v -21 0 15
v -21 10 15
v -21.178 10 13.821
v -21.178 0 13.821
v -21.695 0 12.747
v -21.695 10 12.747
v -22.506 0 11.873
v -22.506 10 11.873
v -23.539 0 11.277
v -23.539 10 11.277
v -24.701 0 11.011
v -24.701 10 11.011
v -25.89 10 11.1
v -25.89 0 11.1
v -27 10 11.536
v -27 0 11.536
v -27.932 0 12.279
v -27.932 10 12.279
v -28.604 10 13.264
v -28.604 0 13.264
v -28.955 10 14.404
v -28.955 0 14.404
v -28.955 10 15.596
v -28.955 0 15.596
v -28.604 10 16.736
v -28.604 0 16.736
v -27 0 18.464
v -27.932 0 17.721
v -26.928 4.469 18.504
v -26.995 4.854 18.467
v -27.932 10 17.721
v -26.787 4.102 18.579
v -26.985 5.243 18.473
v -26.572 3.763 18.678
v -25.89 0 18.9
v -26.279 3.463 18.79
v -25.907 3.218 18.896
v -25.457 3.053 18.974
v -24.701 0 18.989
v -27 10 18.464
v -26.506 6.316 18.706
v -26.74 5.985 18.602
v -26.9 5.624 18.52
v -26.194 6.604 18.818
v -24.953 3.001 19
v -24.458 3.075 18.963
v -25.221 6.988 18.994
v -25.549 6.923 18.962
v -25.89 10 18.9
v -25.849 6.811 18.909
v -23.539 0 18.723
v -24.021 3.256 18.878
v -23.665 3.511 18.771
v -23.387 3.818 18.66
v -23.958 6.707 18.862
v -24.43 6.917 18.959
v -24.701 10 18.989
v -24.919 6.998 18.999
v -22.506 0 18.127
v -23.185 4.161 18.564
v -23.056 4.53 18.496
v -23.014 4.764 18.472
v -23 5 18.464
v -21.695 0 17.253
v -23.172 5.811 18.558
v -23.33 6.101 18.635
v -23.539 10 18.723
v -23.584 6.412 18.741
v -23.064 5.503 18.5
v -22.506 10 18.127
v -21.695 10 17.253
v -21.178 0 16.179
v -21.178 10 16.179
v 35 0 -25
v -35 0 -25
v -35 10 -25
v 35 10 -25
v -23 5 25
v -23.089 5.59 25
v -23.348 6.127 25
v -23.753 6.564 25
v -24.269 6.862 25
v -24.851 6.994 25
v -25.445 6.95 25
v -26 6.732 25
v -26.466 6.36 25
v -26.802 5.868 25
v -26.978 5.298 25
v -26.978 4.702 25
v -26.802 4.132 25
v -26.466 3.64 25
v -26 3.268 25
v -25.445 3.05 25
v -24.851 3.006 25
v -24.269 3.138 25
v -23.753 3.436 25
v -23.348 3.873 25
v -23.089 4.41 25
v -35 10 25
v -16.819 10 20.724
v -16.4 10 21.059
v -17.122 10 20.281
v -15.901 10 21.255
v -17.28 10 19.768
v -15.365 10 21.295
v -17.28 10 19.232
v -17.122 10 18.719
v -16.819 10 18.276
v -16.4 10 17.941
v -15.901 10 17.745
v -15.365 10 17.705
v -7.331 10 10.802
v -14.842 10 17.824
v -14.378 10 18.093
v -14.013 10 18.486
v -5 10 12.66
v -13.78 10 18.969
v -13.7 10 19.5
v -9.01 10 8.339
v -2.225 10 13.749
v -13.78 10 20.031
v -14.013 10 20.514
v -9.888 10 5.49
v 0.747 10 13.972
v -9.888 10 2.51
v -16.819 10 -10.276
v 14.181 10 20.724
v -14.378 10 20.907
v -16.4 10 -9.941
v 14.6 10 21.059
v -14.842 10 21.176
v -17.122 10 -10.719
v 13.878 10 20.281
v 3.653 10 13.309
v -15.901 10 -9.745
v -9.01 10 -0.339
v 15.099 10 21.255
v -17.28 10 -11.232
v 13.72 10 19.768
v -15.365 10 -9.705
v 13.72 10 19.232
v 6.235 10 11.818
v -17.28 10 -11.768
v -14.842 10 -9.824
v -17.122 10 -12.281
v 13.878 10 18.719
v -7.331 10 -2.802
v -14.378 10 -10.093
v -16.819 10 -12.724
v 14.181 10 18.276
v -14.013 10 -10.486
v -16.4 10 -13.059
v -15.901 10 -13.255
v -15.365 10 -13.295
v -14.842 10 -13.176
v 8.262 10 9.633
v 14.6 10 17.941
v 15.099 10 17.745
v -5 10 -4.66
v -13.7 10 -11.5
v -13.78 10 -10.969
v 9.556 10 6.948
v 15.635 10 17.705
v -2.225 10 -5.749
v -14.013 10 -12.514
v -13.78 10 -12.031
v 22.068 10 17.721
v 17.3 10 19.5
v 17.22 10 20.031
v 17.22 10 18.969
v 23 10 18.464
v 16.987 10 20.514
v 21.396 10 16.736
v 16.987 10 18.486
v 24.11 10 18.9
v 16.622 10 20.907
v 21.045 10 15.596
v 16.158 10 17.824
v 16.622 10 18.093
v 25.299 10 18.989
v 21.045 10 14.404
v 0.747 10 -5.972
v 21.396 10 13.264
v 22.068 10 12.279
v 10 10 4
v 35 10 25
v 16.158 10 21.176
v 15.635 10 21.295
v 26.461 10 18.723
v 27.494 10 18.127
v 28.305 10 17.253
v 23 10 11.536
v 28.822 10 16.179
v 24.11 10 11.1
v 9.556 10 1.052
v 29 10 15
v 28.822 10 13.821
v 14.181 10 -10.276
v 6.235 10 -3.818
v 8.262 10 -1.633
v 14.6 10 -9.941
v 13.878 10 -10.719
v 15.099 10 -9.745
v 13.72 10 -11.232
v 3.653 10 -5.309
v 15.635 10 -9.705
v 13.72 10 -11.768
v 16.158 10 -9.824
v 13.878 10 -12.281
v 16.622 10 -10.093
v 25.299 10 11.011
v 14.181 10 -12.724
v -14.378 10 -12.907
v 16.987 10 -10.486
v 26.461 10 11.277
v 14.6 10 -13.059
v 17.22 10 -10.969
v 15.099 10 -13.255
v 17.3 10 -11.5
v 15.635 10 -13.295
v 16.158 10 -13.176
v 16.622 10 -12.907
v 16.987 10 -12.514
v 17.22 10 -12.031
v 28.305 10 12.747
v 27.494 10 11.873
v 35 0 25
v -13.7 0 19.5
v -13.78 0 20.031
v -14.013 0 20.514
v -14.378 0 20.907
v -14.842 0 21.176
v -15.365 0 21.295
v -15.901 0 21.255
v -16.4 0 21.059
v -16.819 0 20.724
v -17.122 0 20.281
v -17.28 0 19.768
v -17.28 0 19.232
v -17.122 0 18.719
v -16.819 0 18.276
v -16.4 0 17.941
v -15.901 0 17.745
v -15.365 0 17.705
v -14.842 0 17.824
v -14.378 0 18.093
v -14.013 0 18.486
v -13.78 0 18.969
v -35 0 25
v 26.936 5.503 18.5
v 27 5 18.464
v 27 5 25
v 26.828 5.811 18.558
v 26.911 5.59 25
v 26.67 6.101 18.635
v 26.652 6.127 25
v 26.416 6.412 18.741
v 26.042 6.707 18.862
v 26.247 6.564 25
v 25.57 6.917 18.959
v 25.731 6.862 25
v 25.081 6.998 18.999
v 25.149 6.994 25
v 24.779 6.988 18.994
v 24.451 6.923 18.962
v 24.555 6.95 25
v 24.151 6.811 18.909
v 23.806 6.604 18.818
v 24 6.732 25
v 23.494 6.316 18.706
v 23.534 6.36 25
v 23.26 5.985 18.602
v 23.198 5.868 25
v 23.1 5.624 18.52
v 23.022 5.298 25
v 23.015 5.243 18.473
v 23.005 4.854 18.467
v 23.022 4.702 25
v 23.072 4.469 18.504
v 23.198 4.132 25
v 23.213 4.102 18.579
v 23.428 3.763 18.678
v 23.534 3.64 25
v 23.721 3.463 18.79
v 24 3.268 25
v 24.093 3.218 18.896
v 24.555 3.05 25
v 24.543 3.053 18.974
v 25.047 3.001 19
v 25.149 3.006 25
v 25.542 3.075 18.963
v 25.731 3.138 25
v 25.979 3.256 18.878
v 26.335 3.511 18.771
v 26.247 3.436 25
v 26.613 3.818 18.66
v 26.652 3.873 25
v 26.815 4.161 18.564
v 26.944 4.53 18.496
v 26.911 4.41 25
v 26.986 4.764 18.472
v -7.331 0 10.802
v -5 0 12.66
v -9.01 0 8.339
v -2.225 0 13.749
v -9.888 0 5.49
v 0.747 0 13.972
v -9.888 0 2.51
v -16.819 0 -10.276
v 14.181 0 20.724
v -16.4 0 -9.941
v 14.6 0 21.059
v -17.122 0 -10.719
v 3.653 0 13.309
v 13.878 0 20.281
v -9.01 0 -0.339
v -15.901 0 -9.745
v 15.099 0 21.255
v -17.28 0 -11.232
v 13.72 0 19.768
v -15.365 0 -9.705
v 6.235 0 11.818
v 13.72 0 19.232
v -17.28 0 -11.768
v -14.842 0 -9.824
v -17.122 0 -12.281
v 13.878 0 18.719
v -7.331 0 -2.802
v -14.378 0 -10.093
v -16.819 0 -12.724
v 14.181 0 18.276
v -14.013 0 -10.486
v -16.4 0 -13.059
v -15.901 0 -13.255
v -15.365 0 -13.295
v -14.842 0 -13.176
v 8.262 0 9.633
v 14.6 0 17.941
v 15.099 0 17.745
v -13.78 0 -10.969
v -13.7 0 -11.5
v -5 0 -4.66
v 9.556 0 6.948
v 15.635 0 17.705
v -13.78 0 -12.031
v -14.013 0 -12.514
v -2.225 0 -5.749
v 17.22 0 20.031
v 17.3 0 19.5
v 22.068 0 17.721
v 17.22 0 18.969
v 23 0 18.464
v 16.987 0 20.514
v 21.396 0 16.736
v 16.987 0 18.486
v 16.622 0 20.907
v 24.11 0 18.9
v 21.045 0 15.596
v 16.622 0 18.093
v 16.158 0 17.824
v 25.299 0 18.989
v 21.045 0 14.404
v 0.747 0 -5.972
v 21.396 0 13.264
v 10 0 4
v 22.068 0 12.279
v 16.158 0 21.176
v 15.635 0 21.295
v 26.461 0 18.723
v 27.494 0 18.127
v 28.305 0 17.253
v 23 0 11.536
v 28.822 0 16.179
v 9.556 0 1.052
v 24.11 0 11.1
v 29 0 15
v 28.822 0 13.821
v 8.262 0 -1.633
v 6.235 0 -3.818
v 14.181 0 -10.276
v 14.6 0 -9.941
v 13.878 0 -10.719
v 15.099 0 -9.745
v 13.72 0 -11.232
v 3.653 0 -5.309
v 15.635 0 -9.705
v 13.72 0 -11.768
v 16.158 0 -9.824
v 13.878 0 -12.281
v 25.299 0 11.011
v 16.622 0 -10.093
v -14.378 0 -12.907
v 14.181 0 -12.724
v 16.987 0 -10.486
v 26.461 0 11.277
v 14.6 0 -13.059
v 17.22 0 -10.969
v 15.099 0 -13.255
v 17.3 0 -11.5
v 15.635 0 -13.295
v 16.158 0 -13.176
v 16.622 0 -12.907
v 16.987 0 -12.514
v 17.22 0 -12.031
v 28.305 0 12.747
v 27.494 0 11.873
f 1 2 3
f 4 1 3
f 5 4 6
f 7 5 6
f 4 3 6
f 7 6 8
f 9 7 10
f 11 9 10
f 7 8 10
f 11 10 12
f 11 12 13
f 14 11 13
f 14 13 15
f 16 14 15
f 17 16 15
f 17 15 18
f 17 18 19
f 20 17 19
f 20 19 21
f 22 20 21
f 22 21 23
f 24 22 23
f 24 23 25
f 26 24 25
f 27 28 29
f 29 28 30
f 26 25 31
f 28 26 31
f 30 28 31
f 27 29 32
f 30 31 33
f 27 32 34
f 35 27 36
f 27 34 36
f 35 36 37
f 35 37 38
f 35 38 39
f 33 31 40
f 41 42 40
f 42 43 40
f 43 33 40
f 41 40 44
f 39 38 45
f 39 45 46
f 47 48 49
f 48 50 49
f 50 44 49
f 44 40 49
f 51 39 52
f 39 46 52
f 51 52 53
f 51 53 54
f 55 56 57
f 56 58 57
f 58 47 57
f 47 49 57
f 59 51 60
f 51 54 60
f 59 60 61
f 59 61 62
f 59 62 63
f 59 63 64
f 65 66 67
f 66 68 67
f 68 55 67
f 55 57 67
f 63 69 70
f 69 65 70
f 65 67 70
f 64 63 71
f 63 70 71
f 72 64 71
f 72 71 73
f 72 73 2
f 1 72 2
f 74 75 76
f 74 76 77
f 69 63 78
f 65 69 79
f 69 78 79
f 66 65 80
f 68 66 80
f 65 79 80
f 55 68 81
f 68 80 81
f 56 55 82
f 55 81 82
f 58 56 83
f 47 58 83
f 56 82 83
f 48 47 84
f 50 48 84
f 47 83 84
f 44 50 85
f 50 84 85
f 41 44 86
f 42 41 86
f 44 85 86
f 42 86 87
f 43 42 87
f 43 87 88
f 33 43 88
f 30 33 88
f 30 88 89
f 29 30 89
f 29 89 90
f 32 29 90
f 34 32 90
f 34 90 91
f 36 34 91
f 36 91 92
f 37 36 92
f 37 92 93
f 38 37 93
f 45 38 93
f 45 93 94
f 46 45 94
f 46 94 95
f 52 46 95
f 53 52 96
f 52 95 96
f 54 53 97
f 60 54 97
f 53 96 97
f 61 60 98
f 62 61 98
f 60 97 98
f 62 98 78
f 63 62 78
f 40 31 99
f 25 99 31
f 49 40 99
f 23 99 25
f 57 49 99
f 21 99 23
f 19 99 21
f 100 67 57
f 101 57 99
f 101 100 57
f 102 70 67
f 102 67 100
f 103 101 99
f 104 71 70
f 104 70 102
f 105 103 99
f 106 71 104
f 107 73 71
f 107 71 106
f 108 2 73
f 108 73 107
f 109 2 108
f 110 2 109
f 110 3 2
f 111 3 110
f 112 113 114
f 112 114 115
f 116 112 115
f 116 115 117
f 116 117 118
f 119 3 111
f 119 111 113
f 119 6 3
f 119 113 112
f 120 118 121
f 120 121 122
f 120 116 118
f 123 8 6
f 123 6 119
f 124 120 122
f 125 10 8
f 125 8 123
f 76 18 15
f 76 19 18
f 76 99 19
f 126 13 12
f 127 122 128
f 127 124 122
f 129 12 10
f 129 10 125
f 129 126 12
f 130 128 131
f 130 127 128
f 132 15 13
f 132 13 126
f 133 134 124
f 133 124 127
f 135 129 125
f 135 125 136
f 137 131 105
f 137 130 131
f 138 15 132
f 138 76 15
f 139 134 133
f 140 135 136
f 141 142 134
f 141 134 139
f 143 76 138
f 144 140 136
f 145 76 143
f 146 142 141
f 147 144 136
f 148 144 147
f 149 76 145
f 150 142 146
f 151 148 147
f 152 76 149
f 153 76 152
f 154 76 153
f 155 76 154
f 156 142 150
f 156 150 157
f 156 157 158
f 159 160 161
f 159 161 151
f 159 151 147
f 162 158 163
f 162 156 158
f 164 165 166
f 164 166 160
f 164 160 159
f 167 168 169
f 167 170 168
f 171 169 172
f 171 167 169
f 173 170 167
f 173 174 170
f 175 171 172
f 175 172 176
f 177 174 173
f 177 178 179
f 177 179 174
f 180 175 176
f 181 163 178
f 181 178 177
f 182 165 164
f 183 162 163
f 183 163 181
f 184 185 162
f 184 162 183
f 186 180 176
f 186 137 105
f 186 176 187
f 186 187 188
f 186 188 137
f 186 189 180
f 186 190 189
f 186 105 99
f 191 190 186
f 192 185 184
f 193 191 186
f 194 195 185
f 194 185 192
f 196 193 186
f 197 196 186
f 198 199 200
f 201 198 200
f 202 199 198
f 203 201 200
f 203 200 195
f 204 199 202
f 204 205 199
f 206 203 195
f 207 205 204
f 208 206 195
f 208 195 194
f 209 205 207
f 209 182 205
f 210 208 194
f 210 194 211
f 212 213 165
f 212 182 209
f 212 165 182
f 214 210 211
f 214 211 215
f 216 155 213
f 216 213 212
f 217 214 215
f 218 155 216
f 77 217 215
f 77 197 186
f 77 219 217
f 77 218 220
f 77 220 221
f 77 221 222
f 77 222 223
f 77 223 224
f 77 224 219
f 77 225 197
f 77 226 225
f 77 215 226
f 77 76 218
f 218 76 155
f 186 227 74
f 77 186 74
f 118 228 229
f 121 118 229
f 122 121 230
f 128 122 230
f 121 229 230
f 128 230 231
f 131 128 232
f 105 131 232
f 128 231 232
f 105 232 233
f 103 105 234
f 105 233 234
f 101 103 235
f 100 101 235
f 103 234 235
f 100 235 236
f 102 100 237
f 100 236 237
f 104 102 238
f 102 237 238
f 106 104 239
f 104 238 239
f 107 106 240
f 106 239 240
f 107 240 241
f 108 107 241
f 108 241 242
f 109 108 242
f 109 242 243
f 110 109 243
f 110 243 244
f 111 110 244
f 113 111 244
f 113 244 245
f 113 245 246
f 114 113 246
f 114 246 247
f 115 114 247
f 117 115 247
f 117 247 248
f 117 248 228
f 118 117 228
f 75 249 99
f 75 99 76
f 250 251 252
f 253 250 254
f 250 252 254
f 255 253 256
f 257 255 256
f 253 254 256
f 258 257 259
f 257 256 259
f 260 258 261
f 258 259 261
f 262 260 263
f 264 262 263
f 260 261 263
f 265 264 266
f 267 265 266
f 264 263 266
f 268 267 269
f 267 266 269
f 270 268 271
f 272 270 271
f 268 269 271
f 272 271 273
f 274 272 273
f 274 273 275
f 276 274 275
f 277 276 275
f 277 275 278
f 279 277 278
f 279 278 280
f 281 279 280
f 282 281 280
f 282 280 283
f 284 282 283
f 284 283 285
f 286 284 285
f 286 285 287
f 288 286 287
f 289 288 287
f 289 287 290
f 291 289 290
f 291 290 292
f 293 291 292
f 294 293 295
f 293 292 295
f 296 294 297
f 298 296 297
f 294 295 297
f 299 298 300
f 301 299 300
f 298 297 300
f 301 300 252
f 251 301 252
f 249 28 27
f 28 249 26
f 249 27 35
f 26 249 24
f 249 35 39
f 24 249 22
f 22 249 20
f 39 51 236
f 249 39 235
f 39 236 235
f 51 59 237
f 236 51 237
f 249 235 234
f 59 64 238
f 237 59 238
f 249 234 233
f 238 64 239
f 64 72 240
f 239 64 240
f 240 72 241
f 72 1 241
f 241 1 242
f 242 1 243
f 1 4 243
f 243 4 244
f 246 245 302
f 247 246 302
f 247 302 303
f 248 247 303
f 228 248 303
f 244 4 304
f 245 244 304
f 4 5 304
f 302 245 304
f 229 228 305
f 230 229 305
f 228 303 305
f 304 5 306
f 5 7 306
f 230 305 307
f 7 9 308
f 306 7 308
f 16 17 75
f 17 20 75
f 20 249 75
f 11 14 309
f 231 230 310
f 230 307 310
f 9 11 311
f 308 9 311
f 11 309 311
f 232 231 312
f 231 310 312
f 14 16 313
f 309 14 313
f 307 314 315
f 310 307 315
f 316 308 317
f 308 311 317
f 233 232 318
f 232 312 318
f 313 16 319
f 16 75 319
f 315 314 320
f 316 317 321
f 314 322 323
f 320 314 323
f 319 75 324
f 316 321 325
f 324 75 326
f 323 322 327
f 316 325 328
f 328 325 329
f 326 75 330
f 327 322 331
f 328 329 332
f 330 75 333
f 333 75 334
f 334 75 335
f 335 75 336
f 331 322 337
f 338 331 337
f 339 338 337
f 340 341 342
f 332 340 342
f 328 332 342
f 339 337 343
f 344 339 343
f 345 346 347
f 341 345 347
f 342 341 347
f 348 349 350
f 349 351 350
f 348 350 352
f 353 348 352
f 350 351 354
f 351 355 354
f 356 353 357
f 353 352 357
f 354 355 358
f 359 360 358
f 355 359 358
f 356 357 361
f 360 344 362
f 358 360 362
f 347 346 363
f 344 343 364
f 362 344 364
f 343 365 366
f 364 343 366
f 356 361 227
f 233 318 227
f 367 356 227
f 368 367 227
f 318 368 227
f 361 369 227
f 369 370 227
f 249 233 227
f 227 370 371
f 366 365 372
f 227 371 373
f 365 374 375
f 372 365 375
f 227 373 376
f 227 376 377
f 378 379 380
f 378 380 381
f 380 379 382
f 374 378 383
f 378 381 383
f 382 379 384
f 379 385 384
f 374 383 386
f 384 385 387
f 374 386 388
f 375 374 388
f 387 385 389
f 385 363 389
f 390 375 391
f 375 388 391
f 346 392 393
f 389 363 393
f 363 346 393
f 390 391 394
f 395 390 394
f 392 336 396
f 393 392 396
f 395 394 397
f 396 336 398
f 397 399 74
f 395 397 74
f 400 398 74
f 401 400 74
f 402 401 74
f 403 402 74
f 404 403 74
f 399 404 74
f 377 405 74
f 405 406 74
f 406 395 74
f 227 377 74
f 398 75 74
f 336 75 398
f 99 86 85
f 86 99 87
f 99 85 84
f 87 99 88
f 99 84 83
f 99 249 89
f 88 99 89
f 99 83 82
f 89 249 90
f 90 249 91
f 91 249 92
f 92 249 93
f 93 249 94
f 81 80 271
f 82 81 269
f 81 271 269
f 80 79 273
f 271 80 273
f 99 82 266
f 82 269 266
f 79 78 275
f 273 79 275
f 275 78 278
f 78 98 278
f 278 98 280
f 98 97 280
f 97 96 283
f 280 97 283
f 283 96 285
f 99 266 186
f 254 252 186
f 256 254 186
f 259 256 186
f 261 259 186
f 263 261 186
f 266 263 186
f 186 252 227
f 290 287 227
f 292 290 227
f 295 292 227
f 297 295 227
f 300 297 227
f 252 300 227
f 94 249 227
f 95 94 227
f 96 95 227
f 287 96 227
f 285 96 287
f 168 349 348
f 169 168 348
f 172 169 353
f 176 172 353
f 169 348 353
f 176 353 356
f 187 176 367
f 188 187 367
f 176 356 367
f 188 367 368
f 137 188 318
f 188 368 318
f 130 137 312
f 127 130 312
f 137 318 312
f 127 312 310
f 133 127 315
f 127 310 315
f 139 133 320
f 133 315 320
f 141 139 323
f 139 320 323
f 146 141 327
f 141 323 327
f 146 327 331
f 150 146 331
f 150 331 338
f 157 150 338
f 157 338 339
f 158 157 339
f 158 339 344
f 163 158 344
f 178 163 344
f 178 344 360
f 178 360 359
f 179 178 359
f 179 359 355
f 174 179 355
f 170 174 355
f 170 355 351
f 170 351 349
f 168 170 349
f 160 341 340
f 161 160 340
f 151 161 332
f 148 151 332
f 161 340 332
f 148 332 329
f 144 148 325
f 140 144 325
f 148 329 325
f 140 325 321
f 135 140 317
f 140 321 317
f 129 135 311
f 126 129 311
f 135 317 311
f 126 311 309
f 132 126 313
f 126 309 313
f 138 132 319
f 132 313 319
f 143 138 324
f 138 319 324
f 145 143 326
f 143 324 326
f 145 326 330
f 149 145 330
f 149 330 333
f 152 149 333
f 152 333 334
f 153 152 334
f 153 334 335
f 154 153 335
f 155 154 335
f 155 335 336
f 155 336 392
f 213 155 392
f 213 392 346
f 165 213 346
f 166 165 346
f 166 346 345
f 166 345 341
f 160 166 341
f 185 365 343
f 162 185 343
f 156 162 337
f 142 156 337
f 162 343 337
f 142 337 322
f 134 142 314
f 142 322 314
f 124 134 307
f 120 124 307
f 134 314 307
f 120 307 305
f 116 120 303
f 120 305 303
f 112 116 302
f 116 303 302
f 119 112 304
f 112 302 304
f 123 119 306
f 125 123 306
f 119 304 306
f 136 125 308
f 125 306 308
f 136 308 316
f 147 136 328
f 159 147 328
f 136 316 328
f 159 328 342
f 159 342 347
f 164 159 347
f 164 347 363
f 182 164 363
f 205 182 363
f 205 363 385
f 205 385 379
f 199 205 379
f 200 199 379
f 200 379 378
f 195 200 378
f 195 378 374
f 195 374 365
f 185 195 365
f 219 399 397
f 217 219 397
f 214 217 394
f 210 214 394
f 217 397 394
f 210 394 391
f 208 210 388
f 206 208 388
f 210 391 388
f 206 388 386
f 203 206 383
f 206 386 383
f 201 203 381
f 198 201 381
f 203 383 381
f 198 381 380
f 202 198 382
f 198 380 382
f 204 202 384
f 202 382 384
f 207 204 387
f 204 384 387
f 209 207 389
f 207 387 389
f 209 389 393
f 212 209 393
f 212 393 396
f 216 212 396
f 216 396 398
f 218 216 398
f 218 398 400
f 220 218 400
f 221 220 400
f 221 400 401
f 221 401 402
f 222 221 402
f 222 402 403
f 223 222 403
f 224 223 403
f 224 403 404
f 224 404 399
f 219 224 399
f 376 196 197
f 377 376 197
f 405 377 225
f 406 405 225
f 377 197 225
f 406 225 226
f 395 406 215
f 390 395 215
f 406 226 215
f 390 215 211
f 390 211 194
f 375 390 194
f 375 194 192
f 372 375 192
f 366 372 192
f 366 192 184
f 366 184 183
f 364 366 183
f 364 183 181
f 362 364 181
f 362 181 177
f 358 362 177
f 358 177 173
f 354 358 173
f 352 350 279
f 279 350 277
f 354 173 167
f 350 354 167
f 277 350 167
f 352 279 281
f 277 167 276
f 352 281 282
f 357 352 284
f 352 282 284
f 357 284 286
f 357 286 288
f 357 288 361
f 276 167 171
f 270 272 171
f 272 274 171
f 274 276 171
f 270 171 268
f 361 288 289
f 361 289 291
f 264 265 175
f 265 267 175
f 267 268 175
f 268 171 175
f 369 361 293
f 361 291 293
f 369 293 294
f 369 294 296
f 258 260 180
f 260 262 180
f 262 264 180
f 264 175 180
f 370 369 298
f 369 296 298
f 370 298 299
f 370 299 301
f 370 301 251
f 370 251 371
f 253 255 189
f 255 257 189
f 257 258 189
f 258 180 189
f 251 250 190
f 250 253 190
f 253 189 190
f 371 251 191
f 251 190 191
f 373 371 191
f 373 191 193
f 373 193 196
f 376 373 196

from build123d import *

# Parameters (mm, degrees)
SKETCH2_W           = 70
SKETCH2_H           = 50
BOSS_EXTRUDE1_DEPTH = 10
SKETCH3_R           = 4
CUT_EXTRUDE1_DEPTH  = 11
SKETCH4_R           = 1.8
CUT_EXTRUDE2_DEPTH  = 11
SKETCH5_R           = 10
CUT_EXTRUDE3_DEPTH  = 11
SKETCH6_R           = 2
CUT_EXTRUDE5_DEPTH  = 10


with BuildPart() as part:
    # Sketch2 → Boss-Extrude1 (new body)
    with BuildSketch(Plane(origin=(0, 0, 0), x_dir=(1, 0, 0), z_dir=(0, 1, 0))):
        Rectangle(SKETCH2_W, SKETCH2_H)
    extrude(amount=BOSS_EXTRUDE1_DEPTH)

    # Sketch3 → Cut-Extrude1 (cut, through all)
    with BuildSketch(Plane(origin=(0, 10, 0), x_dir=(1, 0, 0), z_dir=(0, 1, 0))):
        with Locations((-25, -15)):
            Circle(SKETCH3_R)
        with Locations((25, -15)):
            Circle(SKETCH3_R)
    extrude(amount=-CUT_EXTRUDE1_DEPTH, mode=Mode.SUBTRACT)

    # Sketch4 → Cut-Extrude2 (cut, through all)
    with BuildSketch(Plane.XZ):
        with Locations((-15.5, 19.5)):
            Circle(SKETCH4_R)
        with Locations((-15.5, -11.5)):
            Circle(SKETCH4_R)
        with Locations((15.5, -11.5)):
            Circle(SKETCH4_R)
        with Locations((15.5, 19.5)):
            Circle(SKETCH4_R)
    extrude(amount=-CUT_EXTRUDE2_DEPTH, mode=Mode.SUBTRACT)

    # Sketch5 → Cut-Extrude3 (cut, through all)
    with BuildSketch(Plane.XZ):
        with Locations((0, 4)):
            Circle(SKETCH5_R)
    extrude(amount=-CUT_EXTRUDE3_DEPTH, mode=Mode.SUBTRACT)

    # Sketch6 → Cut-Extrude5 (cut)
    with BuildSketch(Plane.XY.offset(25)):
        with Locations((25, 5)):
            Circle(SKETCH6_R)
        with Locations((-25, 5)):
            Circle(SKETCH6_R)
    extrude(amount=-CUT_EXTRUDE5_DEPTH, mode=Mode.SUBTRACT)


solid = part.part
